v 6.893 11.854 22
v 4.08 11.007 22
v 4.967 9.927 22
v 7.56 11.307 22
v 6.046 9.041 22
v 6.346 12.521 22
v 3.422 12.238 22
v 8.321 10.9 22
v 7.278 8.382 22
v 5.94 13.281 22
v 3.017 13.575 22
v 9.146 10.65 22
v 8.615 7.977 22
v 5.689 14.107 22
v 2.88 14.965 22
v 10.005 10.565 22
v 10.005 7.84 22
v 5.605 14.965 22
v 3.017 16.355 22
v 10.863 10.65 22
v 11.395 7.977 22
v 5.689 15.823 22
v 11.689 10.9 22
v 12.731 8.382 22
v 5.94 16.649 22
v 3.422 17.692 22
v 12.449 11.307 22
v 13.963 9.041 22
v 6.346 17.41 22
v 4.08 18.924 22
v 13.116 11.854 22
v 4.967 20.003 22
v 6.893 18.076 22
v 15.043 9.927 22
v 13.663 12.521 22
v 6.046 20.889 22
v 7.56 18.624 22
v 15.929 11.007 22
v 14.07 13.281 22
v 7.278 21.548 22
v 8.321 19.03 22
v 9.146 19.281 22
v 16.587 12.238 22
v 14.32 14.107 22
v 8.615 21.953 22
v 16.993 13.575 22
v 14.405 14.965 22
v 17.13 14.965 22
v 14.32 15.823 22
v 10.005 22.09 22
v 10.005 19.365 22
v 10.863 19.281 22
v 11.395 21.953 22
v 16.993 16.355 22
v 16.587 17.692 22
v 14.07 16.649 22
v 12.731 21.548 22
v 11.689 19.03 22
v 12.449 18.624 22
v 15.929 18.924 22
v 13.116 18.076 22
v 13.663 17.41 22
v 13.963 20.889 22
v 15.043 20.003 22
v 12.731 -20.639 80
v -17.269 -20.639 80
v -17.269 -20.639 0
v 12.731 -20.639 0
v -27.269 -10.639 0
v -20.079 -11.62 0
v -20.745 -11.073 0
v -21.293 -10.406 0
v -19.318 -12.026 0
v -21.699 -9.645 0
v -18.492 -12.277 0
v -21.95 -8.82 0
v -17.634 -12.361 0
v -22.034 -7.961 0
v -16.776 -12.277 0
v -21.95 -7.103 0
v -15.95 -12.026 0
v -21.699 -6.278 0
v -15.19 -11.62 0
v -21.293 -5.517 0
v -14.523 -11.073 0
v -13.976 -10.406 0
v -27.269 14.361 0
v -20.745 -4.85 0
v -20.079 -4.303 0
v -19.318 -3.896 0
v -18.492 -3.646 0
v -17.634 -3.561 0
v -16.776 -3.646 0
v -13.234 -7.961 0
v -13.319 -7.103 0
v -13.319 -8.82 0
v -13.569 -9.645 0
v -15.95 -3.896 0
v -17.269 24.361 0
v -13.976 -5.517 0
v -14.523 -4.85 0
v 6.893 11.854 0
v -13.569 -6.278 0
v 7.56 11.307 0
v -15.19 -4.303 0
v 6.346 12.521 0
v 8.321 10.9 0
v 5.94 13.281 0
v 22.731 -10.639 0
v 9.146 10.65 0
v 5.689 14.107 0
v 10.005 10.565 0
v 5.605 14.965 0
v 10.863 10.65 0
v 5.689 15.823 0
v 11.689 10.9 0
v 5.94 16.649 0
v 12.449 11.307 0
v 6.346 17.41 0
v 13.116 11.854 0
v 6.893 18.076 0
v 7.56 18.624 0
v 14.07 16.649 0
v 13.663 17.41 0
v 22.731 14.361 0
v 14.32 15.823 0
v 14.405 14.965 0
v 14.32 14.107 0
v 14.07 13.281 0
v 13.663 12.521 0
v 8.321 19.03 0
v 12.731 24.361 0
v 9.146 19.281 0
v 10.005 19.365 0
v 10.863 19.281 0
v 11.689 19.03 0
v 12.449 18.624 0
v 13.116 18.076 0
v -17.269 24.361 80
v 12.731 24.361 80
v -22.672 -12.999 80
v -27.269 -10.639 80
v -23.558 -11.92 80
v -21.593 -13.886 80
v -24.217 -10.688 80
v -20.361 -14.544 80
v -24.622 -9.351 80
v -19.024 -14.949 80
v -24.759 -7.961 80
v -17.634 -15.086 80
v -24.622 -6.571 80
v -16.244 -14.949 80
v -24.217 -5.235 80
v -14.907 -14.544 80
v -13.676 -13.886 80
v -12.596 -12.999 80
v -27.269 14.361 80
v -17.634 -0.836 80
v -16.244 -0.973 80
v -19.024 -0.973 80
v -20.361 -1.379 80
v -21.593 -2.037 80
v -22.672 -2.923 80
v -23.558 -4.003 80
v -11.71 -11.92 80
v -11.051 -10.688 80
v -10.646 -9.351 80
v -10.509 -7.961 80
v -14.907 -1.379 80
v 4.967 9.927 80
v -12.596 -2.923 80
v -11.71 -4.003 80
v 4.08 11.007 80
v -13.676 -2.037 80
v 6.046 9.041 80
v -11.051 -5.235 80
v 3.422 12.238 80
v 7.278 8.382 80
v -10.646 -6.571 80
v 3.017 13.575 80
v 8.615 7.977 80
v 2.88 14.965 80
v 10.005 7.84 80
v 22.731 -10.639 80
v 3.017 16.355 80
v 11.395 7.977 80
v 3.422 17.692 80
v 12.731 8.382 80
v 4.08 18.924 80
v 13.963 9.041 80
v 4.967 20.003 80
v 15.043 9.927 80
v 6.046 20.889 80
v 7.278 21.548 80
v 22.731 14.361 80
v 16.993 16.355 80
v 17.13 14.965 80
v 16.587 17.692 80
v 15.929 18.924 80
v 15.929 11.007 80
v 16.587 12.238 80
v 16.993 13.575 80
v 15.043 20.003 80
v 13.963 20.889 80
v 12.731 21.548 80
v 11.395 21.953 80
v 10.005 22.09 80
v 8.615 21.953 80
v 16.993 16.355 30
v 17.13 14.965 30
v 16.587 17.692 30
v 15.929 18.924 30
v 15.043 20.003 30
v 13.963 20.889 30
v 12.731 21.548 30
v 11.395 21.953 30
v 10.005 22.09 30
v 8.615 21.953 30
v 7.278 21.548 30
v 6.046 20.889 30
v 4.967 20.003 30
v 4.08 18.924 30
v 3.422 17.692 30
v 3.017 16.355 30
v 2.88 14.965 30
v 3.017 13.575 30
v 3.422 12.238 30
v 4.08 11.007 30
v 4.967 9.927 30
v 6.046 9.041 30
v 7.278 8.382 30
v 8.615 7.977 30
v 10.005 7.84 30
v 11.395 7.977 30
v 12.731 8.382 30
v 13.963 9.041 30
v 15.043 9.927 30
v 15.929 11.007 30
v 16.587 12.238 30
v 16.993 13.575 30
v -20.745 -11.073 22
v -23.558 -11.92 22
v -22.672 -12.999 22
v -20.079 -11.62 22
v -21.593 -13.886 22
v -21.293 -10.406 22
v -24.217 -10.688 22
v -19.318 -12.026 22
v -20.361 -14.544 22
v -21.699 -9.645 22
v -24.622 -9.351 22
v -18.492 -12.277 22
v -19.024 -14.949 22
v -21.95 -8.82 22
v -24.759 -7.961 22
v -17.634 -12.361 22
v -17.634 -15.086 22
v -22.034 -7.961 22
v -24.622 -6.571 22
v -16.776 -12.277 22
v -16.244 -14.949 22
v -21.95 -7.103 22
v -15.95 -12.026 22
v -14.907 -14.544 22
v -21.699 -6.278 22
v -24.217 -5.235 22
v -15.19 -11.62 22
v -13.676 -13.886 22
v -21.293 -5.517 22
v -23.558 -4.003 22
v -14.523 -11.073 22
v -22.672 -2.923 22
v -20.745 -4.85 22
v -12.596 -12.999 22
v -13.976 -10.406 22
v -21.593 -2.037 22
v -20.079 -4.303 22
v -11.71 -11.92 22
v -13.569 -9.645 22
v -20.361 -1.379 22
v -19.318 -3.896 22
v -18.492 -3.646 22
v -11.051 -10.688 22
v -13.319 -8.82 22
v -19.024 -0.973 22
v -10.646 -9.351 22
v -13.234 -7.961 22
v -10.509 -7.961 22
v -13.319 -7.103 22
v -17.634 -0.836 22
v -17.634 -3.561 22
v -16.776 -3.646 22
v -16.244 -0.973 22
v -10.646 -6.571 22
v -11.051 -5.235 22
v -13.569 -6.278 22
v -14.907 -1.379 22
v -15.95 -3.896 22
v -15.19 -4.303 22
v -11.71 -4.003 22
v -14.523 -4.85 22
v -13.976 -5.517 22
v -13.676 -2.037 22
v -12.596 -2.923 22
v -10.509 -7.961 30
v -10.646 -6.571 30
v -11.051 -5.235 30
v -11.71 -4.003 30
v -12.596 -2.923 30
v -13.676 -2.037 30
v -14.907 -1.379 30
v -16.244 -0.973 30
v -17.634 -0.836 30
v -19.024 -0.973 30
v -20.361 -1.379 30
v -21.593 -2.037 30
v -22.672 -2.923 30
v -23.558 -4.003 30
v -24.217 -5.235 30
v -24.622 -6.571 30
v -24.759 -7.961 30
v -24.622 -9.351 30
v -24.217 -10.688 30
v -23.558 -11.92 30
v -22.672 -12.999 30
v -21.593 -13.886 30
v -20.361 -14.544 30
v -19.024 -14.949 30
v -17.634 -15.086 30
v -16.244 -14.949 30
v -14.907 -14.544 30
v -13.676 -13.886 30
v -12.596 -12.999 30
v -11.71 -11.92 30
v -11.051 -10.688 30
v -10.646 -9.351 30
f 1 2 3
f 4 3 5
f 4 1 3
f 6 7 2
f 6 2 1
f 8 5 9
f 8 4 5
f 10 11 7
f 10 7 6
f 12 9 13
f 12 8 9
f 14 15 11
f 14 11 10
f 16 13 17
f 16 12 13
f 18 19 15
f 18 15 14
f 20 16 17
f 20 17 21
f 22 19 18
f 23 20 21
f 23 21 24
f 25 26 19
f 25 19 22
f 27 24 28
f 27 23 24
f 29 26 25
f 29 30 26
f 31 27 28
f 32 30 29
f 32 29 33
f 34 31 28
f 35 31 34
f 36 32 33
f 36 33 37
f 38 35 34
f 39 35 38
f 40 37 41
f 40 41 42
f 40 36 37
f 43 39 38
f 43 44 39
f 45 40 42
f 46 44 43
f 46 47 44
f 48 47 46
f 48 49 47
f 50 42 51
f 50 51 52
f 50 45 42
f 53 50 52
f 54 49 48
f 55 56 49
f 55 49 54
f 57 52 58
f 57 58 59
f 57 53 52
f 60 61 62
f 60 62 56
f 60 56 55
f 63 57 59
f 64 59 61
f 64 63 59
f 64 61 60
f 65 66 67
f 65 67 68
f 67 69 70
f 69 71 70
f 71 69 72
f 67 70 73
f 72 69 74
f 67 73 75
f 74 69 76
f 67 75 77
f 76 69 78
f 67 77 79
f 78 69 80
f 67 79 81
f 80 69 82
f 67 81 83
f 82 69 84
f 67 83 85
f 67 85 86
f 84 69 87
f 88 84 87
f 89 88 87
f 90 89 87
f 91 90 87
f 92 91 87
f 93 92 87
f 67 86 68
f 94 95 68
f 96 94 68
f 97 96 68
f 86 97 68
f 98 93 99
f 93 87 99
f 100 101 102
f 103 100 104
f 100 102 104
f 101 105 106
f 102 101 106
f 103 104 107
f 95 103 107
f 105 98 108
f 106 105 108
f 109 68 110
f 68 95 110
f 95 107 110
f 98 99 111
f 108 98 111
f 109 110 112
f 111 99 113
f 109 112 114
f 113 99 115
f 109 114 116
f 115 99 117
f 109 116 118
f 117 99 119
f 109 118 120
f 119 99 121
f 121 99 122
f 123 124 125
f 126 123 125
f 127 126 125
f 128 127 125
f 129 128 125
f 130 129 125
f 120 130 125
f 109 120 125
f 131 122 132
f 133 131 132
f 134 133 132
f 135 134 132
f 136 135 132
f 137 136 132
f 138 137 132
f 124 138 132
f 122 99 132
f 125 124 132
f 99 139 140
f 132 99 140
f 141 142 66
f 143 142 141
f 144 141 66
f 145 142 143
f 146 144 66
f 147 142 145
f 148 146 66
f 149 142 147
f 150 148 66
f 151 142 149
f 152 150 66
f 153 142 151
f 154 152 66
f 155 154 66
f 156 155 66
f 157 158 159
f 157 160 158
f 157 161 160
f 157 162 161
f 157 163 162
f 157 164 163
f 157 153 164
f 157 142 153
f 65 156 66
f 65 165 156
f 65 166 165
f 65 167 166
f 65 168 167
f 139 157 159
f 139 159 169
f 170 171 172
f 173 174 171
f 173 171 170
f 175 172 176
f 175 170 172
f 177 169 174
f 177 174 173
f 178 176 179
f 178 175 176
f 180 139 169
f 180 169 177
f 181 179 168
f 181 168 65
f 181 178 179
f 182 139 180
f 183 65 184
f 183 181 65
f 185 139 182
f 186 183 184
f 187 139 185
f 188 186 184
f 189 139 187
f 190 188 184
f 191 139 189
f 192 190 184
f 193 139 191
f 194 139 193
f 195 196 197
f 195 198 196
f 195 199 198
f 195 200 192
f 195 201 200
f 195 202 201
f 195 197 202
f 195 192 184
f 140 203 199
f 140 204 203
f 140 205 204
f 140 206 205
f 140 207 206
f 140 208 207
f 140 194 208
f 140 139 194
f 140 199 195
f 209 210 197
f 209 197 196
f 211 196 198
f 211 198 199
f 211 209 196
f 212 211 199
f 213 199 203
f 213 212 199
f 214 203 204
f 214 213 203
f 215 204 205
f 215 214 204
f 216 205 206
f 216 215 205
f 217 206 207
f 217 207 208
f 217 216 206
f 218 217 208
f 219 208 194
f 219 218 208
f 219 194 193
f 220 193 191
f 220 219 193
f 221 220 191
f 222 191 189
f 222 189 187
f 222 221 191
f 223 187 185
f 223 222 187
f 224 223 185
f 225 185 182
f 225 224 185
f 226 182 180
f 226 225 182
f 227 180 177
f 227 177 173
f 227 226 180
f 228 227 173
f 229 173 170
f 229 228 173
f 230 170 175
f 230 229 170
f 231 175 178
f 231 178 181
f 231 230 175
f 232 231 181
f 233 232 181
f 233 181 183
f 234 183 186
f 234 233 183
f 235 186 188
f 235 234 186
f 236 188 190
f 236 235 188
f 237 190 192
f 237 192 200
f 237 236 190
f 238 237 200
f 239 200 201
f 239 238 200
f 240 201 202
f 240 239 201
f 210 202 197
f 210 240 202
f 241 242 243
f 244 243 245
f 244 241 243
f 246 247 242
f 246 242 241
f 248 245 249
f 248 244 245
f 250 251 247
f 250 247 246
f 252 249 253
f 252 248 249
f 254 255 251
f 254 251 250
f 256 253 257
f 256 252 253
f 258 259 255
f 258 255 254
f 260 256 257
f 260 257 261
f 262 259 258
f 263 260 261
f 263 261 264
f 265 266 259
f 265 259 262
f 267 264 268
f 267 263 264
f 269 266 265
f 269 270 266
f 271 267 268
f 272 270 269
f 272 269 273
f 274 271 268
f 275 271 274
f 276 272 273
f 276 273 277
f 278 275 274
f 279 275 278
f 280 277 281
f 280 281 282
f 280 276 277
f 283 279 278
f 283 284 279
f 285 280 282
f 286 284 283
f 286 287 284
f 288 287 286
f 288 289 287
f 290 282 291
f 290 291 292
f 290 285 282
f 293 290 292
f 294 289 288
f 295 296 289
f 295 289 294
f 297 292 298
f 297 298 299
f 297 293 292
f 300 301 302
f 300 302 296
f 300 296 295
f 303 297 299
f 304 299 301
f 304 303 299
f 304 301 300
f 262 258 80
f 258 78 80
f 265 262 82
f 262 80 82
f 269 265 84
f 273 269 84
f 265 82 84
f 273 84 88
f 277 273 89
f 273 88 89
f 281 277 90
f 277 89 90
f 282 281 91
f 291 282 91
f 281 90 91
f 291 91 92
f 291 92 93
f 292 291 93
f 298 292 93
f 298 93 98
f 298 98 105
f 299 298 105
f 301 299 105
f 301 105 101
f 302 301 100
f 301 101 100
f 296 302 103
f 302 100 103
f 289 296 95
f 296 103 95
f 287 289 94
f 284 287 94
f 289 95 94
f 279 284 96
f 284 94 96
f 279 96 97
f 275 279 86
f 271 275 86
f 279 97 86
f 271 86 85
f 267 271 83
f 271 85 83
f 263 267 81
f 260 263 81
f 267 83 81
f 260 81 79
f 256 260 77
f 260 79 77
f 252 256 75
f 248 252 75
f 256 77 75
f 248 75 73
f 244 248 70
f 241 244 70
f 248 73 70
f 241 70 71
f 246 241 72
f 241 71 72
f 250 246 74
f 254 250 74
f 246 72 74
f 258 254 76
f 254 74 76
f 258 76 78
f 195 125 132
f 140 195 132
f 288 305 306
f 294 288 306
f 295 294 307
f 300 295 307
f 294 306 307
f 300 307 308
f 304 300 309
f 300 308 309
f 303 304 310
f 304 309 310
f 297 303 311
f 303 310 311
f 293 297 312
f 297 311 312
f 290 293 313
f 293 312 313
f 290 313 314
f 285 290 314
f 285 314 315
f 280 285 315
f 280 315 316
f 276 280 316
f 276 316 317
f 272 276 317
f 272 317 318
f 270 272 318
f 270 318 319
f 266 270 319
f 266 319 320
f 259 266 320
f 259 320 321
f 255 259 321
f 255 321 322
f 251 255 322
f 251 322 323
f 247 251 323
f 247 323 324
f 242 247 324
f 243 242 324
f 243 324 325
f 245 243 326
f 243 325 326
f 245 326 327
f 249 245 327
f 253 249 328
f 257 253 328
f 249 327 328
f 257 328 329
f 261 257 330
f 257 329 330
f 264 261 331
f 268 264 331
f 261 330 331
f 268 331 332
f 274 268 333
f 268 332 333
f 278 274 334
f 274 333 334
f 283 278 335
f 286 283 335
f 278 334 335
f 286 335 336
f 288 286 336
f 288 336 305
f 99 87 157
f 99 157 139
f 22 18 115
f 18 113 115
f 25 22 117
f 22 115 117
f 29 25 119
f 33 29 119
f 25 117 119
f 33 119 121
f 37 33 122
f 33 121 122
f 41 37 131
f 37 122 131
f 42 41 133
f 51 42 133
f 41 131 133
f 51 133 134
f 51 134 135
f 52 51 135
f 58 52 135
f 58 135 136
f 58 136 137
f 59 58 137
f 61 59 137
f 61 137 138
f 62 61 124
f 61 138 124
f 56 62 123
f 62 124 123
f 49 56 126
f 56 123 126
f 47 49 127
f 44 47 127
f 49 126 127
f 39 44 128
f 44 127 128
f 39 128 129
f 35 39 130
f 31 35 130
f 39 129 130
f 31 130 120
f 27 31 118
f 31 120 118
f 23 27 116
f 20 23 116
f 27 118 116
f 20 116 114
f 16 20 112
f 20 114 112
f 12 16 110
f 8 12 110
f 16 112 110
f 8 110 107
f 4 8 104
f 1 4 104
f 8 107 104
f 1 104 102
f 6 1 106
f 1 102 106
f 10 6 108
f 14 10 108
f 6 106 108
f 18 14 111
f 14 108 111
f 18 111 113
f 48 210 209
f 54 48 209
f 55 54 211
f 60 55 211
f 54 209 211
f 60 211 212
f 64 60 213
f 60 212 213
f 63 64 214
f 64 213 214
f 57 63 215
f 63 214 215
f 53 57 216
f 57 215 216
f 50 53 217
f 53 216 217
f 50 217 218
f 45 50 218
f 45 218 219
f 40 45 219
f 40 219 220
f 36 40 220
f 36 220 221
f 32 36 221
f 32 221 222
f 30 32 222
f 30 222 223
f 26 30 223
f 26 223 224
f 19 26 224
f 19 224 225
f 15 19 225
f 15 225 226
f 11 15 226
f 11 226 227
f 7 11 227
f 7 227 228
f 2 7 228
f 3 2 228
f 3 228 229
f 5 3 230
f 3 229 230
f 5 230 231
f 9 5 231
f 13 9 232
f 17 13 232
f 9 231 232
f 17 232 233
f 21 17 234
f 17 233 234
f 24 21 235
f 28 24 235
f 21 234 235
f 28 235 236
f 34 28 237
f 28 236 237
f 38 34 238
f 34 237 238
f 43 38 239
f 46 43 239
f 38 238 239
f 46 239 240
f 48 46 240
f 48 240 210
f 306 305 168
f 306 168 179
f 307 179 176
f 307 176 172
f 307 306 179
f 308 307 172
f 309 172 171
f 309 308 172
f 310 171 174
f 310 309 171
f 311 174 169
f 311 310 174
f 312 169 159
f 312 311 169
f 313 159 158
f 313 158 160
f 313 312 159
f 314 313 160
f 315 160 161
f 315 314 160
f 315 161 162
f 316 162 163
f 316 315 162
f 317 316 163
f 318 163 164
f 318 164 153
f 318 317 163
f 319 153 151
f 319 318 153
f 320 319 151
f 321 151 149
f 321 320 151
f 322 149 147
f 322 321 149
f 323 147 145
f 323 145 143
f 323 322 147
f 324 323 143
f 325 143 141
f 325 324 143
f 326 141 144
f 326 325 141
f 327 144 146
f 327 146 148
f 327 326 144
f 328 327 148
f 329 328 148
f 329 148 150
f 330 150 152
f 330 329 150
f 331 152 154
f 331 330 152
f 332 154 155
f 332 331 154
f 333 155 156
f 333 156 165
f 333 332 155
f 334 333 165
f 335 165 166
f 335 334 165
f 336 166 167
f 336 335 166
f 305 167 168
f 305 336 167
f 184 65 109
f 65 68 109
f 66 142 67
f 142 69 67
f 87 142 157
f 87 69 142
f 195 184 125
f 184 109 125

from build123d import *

# Parameters (mm, degrees)
F0_W           = 50
F0_H           = 45
F1_DEPTH       = 30
F2_SIZE        = 10
F4_D           = 8.8
F4_CBORE_D     = 14.25
F4_CBORE_DEPTH = 8
F5_DEPTH       = 50


with BuildPart() as f1:
    # F0 (on Top) → F1 (new body)
    with BuildSketch(Plane.XY):
        with Locations((-2.2690217942, 1.8614111841)):
            Rectangle(F0_W, F0_H)
    extrude(amount=F1_DEPTH)

    # F2
    f2_edges = [f1.edges().sort_by_distance(p)[0] for p in [
        (-27.269022, 24.361411, 15),
        (22.730978, -20.638589, 15),
        (22.730978, 24.361411, 15),
        (-27.269022, -20.638589, 15),
    ]]
    chamfer(f2_edges, length=F2_SIZE)

    # F4 (through all)
    with Locations(Plane.XY.offset(30)):
        with Locations((-17.6340711126, -7.961328021), (10.0047006537, 14.9650736012)):
            CounterBoreHole(F4_D / 2, F4_CBORE_D / 2, F4_CBORE_DEPTH)

    # F5 (add): a face of the model
    f5_faces = [f1.faces().sort_by_distance(p)[0] for p in [
        (-1.9842087331, 1.5591300529, 30),
    ]]
    extrude(f5_faces, amount=F5_DEPTH)


solid = f1.part
